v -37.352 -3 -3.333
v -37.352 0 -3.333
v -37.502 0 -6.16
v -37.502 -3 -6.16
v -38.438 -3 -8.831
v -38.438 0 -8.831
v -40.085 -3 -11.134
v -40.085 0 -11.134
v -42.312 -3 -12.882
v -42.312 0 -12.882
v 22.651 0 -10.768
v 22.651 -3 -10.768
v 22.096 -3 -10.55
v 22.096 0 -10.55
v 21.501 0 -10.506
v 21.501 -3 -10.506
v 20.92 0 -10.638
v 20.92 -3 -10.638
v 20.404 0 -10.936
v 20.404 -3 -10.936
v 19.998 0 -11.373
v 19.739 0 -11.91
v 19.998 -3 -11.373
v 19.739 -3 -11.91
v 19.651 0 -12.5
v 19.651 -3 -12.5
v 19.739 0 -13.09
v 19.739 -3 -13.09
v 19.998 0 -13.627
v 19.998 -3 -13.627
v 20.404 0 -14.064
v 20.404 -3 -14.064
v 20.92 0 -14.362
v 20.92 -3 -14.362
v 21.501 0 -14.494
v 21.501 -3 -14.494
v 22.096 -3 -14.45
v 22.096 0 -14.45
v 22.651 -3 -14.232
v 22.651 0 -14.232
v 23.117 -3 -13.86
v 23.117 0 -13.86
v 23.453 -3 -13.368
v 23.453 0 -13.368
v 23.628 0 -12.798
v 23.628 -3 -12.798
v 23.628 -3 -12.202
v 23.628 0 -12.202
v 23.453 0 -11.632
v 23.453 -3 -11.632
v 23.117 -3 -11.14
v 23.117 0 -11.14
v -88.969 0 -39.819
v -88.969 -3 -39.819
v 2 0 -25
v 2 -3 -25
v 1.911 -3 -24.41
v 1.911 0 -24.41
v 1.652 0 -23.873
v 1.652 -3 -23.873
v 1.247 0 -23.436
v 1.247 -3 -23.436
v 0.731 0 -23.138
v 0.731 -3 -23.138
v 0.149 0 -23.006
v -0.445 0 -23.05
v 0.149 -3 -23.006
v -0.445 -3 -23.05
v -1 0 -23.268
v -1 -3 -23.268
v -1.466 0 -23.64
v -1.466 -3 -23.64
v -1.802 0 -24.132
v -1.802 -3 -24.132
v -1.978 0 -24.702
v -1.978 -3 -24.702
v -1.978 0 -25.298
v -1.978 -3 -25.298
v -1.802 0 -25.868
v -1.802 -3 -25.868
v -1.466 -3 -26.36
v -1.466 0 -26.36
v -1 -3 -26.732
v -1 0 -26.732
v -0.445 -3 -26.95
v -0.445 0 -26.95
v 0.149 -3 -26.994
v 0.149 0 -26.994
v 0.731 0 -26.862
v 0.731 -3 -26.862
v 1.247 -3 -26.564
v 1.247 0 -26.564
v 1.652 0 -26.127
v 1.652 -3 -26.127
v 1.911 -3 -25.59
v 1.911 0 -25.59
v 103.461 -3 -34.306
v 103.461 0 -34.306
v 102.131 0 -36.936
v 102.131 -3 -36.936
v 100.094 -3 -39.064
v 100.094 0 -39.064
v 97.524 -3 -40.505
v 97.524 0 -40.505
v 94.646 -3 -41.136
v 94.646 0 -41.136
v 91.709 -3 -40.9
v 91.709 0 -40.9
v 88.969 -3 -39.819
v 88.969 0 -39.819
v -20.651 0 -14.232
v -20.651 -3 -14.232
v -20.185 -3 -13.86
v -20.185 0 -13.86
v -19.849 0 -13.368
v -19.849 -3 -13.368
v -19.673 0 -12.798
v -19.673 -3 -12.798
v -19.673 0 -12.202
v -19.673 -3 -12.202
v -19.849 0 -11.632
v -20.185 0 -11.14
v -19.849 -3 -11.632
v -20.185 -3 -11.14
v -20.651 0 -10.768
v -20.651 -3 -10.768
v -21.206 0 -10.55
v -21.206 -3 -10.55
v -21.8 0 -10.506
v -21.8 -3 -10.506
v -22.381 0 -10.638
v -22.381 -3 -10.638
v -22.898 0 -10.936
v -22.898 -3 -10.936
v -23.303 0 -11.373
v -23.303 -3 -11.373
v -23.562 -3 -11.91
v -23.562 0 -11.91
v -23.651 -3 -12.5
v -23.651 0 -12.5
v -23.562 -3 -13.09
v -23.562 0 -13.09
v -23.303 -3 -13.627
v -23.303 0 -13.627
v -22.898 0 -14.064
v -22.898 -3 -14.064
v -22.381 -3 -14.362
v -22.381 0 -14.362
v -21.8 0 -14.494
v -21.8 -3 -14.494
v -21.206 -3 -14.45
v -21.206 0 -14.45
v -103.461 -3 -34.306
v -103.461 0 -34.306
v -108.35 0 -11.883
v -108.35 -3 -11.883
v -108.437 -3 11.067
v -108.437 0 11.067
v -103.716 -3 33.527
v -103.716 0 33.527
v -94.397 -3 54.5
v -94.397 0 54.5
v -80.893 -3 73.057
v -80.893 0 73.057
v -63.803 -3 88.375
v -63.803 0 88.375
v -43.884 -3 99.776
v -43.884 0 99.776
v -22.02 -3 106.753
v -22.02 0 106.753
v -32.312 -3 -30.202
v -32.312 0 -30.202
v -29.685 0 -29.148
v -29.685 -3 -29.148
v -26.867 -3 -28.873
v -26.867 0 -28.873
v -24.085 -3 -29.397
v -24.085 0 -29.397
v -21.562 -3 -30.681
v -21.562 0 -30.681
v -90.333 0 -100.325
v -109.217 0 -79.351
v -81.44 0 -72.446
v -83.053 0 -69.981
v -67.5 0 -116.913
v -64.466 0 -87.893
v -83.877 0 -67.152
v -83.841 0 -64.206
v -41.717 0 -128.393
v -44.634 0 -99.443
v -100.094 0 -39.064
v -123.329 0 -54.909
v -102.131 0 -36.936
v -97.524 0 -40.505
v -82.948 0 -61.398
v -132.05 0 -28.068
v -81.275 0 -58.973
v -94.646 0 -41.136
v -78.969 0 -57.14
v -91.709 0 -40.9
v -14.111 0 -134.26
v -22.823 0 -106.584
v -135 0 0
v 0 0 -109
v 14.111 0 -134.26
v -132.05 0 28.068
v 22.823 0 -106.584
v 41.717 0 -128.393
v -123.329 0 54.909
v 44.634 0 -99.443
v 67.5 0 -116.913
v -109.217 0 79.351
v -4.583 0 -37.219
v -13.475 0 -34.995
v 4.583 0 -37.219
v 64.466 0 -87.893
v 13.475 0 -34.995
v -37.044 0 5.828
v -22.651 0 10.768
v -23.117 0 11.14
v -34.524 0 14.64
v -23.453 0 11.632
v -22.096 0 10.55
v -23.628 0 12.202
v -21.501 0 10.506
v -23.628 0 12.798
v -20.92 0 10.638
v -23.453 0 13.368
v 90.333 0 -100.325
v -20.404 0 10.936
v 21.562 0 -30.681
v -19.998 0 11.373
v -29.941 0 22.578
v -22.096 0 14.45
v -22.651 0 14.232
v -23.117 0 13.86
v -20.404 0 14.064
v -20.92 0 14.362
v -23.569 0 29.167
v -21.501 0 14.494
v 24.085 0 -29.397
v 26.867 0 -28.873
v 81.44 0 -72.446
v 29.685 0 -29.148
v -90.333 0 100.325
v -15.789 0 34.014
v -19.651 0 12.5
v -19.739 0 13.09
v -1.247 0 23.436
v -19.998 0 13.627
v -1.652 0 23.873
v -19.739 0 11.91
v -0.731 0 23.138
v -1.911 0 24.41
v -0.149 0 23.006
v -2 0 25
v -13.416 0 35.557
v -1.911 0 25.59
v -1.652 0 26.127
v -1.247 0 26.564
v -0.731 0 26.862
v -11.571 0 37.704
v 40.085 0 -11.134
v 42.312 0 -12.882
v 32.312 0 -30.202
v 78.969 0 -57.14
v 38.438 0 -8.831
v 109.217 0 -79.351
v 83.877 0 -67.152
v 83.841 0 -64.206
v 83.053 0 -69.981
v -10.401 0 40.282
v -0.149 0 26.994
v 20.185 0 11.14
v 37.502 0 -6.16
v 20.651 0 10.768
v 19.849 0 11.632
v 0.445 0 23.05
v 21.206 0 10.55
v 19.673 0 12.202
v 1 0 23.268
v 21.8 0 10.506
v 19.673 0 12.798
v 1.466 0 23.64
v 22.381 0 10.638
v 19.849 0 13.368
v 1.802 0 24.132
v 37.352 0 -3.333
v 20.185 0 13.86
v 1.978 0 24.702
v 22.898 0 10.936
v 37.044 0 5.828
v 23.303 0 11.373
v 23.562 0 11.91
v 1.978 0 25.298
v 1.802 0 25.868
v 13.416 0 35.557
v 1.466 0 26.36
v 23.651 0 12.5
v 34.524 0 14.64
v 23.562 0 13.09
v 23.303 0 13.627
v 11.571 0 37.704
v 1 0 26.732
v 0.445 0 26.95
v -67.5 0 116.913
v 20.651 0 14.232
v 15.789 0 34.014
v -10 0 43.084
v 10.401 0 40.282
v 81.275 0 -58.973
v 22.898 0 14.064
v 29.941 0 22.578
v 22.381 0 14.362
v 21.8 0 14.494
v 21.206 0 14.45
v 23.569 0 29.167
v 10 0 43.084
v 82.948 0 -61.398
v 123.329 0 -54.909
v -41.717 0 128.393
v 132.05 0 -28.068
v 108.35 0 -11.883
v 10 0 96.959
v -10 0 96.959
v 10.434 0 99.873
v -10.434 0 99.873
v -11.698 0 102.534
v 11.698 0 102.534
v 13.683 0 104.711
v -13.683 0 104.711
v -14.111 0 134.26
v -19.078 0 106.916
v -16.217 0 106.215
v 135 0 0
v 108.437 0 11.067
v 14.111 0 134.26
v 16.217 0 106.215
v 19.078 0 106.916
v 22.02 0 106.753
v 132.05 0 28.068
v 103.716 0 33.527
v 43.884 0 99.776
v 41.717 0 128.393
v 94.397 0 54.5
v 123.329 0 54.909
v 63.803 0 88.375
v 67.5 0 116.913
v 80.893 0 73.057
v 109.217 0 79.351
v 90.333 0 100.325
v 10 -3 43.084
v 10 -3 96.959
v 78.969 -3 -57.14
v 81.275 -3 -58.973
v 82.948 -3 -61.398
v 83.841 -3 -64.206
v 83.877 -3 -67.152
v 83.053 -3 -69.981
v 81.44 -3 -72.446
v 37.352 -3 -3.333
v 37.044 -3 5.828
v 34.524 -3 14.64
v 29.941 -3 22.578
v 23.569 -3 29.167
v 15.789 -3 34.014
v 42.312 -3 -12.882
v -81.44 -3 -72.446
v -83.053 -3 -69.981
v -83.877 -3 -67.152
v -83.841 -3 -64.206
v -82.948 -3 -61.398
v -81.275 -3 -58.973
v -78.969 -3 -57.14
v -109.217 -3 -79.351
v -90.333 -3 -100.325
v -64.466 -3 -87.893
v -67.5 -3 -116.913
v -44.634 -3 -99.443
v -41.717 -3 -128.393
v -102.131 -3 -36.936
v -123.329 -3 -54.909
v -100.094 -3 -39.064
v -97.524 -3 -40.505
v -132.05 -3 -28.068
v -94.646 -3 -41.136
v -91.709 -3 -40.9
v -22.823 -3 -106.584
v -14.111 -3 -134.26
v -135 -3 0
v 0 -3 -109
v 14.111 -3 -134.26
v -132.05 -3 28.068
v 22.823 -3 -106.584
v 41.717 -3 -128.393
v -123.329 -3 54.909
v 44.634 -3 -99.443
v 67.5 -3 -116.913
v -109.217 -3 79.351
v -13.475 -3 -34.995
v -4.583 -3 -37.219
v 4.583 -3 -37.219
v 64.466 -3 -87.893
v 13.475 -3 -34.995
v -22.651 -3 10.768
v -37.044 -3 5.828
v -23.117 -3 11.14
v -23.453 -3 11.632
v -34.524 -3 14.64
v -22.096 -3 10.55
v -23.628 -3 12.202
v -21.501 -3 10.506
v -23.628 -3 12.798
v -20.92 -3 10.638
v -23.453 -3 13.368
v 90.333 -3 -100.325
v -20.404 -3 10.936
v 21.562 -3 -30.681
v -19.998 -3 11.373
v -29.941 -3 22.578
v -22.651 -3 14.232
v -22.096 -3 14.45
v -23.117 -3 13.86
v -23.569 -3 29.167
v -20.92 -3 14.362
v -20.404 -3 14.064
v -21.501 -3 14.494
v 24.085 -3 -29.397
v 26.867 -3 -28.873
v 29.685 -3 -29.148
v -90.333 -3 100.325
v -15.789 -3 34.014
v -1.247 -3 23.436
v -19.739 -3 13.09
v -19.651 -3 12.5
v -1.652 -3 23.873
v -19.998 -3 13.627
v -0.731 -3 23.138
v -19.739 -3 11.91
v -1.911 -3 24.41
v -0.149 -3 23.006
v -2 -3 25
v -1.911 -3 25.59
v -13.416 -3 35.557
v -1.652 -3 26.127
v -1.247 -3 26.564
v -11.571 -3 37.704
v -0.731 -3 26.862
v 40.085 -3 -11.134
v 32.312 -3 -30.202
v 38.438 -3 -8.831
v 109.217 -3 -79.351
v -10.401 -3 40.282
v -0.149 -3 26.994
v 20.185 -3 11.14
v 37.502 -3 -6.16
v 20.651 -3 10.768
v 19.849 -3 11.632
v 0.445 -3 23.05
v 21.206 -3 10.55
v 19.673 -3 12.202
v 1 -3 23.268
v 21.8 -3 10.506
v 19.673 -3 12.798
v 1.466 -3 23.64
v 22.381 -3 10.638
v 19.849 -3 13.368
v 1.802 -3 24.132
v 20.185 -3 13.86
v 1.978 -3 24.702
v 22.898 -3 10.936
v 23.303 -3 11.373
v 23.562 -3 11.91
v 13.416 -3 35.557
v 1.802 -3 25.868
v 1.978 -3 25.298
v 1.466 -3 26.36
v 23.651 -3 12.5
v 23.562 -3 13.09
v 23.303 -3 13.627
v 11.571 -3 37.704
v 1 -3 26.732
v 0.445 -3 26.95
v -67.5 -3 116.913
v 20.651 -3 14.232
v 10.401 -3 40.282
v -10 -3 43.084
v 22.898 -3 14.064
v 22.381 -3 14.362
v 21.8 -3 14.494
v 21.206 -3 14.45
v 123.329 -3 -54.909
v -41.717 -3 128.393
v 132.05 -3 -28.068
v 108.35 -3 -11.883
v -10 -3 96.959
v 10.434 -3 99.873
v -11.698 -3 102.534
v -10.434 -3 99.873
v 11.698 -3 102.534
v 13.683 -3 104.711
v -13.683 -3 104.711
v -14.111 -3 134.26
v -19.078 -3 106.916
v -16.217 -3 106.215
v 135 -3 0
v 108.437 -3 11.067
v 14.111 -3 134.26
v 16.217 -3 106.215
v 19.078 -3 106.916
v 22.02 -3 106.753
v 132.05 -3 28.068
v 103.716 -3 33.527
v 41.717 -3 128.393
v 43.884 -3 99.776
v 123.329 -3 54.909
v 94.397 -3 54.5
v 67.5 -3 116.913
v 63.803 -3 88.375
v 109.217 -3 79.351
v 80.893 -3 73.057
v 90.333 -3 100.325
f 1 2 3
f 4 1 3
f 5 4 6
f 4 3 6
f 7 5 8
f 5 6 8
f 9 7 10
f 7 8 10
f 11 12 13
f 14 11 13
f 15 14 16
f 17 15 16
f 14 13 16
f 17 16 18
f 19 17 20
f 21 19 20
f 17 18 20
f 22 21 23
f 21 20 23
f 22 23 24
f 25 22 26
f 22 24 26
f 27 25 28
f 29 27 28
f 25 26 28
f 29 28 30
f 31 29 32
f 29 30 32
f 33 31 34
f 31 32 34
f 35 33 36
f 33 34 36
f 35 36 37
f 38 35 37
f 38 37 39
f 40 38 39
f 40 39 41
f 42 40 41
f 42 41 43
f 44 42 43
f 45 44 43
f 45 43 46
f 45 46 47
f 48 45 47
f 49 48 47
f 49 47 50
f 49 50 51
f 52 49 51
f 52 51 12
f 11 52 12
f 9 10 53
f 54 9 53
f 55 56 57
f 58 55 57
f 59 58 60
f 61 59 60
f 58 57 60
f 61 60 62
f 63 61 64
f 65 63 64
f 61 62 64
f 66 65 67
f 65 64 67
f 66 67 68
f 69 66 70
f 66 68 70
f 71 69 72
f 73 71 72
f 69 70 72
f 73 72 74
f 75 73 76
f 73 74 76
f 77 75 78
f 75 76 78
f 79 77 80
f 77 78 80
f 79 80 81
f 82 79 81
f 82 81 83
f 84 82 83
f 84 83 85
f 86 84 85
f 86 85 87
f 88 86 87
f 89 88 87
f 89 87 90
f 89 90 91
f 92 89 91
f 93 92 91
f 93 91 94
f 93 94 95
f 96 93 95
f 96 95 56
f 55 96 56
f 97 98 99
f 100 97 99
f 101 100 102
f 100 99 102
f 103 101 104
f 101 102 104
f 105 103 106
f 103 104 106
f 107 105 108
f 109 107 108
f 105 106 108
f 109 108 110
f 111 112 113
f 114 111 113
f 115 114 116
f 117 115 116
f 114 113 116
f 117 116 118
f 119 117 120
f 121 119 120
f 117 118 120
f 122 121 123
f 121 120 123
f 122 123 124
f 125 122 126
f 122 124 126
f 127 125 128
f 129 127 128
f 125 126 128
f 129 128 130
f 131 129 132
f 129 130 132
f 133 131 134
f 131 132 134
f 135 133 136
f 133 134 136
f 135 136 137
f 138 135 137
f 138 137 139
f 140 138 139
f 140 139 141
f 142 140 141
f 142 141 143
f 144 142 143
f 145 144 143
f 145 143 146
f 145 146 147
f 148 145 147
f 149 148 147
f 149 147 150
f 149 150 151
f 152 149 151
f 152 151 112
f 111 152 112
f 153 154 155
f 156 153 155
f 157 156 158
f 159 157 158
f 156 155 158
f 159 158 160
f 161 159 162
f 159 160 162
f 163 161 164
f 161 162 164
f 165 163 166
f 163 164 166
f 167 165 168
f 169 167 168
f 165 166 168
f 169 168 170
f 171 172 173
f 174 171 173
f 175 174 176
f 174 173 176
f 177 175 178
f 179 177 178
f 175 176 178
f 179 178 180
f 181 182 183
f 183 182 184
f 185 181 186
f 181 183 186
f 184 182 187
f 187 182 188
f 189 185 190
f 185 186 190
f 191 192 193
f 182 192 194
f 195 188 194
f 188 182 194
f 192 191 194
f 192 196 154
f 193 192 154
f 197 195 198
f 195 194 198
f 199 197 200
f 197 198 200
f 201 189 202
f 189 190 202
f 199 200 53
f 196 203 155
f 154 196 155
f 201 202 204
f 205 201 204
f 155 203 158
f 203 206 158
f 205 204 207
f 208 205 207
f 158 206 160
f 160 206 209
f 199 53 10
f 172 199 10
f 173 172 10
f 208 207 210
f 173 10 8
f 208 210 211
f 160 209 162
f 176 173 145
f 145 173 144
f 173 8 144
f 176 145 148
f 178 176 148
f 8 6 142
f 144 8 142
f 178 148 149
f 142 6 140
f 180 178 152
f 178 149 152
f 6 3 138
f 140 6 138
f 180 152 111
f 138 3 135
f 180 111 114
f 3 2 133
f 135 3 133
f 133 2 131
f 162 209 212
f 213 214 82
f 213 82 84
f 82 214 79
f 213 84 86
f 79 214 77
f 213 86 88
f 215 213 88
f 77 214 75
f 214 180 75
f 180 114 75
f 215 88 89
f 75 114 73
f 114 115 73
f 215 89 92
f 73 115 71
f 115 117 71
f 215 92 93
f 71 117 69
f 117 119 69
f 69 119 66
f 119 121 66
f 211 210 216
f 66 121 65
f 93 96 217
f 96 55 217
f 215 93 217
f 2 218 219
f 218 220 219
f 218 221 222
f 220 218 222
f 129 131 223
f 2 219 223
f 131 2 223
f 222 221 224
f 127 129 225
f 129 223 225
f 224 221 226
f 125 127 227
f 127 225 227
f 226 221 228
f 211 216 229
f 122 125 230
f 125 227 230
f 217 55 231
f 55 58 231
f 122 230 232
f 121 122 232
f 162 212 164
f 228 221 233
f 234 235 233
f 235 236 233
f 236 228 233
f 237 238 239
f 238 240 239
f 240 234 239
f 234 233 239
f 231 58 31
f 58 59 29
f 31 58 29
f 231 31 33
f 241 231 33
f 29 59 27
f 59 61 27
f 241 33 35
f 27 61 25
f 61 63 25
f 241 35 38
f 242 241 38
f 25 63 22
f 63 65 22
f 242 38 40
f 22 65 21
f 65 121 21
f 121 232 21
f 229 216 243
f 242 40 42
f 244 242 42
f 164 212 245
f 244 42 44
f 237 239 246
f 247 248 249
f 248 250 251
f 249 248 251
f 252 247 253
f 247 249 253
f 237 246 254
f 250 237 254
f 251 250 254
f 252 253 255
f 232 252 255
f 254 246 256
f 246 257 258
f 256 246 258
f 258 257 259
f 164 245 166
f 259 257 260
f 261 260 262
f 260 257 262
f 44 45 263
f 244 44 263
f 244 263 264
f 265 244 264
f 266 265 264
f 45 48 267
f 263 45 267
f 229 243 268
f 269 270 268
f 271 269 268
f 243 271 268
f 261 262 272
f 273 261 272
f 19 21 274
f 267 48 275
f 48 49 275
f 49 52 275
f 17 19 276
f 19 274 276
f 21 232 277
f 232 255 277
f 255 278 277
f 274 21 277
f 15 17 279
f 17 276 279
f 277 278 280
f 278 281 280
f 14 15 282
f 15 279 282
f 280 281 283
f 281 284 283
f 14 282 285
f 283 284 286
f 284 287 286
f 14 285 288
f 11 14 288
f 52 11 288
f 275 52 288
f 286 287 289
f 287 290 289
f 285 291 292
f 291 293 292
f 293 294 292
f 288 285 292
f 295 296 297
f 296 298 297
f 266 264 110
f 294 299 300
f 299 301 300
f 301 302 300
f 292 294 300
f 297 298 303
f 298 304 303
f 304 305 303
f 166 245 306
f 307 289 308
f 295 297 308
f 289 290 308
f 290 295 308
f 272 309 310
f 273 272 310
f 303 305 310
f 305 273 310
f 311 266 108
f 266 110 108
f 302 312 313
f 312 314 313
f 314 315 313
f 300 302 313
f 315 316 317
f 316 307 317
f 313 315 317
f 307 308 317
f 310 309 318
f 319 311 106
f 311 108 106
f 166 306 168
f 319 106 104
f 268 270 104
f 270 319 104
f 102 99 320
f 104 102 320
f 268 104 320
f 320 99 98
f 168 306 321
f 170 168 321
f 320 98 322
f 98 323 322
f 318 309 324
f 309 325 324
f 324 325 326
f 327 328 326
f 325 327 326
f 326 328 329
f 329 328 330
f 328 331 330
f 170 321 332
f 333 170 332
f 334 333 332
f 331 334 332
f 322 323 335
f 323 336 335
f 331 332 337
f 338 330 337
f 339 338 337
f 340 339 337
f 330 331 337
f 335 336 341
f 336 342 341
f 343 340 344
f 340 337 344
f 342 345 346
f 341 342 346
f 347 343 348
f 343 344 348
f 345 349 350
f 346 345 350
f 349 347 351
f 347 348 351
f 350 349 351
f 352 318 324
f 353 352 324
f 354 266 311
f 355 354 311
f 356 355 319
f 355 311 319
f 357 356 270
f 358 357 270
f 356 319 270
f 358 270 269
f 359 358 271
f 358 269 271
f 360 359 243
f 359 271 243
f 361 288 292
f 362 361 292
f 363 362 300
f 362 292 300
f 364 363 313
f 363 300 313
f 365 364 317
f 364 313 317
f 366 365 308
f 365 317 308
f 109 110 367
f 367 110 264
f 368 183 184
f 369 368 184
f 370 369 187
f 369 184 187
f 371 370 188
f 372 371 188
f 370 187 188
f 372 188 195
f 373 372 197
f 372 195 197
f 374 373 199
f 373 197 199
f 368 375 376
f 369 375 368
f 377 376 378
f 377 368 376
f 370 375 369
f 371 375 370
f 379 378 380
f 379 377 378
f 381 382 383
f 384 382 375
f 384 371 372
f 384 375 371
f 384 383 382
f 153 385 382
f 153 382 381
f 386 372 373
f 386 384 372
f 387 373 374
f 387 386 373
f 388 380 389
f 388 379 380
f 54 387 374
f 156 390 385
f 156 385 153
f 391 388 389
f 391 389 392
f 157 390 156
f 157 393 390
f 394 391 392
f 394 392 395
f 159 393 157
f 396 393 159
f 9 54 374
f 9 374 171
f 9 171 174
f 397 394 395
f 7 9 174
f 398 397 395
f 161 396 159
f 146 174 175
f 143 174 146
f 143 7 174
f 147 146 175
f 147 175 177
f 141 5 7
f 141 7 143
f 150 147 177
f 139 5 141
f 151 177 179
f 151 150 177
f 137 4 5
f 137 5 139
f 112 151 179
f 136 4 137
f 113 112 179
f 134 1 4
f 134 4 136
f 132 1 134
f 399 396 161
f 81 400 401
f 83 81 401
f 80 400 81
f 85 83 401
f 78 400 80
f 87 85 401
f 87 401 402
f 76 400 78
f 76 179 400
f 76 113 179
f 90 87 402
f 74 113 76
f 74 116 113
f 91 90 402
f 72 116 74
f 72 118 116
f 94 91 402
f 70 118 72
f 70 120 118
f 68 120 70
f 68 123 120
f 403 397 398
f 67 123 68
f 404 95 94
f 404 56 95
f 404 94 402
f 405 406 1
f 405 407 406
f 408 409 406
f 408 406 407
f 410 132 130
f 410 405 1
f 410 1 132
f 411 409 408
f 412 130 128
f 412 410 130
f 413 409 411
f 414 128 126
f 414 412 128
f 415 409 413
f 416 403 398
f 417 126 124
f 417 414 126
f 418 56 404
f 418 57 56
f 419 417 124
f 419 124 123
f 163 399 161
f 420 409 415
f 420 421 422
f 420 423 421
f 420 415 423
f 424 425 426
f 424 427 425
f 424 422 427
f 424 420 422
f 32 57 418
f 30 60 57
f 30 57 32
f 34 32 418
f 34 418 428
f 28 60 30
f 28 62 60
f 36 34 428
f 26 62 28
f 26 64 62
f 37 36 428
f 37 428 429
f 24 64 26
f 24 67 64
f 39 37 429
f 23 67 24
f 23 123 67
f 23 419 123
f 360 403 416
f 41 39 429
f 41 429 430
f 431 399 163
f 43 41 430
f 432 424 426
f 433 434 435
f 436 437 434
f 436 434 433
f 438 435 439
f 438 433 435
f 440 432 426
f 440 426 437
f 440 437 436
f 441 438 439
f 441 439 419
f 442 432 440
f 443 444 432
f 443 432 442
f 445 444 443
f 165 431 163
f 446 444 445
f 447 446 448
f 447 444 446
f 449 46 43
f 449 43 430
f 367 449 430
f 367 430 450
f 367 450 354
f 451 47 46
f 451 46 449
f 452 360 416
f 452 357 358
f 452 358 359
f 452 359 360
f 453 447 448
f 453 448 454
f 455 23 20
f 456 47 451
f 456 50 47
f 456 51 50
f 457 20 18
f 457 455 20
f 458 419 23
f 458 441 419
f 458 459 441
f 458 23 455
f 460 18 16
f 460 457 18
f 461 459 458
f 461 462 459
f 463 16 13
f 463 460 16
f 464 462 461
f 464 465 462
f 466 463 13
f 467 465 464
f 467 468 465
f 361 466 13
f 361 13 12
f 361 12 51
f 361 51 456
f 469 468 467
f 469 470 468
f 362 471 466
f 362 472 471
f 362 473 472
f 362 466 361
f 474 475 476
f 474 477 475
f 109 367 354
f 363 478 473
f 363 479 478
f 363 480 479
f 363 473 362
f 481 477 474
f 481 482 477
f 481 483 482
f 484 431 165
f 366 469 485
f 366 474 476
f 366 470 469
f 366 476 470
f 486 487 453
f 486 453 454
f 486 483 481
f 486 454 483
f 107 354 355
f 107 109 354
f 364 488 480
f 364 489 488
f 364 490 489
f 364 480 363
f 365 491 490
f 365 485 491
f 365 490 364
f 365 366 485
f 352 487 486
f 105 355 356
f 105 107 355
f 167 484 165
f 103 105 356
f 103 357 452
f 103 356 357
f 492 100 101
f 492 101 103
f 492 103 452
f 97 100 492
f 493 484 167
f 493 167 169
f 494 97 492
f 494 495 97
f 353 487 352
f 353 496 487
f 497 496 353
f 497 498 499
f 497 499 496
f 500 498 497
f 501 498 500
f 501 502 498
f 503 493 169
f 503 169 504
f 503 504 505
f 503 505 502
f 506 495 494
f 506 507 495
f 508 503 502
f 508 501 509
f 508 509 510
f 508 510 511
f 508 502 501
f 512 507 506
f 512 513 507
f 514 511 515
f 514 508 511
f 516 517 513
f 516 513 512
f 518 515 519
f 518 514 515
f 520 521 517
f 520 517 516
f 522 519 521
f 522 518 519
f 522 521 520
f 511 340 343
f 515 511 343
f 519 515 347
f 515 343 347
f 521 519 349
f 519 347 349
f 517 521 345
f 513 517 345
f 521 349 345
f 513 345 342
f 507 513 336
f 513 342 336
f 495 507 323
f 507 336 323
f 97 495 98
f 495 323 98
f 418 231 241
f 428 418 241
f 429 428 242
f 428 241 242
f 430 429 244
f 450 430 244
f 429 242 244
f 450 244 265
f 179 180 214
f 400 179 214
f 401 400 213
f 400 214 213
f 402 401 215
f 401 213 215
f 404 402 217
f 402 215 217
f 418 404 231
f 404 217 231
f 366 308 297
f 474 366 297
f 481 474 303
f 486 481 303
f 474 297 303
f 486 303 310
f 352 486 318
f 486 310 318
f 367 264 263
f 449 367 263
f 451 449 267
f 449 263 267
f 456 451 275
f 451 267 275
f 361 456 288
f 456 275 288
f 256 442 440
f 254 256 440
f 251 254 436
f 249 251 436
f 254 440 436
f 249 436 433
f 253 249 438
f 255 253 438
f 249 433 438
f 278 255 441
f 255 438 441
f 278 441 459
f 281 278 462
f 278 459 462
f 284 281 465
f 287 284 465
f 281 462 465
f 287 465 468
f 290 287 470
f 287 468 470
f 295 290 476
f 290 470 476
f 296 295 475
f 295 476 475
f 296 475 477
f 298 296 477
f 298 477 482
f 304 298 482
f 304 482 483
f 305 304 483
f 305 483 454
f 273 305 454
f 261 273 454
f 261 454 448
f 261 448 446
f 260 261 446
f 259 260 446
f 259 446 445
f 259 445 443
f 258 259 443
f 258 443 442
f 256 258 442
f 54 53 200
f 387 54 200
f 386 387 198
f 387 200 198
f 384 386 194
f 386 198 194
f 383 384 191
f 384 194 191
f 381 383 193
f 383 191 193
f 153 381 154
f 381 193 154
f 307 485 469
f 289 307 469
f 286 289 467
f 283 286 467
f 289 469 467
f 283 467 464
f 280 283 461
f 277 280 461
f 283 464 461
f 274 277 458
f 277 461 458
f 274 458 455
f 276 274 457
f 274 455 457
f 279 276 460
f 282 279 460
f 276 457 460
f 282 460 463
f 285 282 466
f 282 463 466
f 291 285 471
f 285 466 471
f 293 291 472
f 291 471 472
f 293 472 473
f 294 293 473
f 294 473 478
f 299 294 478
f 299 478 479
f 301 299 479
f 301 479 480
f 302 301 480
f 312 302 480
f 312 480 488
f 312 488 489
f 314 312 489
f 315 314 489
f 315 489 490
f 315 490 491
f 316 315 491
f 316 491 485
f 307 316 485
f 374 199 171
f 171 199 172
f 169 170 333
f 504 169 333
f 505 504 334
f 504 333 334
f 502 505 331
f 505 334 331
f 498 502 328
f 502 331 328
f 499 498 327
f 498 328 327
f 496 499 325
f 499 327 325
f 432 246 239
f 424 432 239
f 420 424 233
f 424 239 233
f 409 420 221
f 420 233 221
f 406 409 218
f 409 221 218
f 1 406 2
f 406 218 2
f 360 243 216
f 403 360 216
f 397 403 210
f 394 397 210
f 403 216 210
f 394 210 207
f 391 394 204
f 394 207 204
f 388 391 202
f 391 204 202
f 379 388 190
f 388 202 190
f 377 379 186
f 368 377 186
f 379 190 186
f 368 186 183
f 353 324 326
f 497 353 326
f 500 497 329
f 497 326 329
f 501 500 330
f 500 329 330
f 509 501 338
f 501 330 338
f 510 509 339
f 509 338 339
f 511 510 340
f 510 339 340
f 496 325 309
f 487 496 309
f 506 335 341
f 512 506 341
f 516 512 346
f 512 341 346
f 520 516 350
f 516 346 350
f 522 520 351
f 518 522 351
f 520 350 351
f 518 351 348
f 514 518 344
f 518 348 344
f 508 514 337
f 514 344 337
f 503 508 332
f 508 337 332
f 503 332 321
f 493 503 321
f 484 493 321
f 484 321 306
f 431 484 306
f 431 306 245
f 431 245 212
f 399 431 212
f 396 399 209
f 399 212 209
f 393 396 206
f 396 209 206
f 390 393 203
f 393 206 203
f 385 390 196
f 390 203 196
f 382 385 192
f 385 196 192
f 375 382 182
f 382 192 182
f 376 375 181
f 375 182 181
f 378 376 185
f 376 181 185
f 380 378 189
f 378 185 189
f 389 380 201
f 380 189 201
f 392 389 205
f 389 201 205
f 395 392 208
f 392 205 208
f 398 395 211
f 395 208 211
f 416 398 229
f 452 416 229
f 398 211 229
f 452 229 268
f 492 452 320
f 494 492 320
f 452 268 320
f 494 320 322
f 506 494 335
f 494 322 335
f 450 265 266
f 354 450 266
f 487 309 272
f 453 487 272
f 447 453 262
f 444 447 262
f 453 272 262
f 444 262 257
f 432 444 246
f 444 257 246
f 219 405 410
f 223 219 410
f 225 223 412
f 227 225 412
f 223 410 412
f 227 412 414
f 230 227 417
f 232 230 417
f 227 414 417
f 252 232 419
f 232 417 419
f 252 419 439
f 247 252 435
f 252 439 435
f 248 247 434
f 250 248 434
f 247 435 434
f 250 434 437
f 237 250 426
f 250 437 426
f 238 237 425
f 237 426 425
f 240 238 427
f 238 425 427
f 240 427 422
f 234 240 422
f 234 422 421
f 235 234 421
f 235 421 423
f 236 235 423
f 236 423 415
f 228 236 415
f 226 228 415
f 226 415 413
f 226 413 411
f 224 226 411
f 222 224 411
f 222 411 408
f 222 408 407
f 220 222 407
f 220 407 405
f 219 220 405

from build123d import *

# Parameters (mm, degrees)
F0_R            = 135
F1_DEPTH        = 3
F3_D            = 4
F3_COPIES_COUNT = 6


# Not quite as in the source:
# - a pattern or mirror of a feature is missing from the dataset's text; its kind, count and spacing are read off the source's solid


with BuildPart() as f1:
    # F0 (on Front) → F1 (new body)
    with BuildSketch(Plane.XZ):
        Circle(F0_R)
        with BuildLine():
            Line((-78.968744185, -57.1396310965), (-32.3120288915, -30.2023639624))
            ThreePointArc((-32.3120288915, -30.2023639624), (-26.8672094621, -28.8725161151), (-21.5621280722, -30.6810142107))
            ThreePointArc((-21.5621280722, -30.6810142107), (0, -37.5), (21.5621280722, -30.6810142107))
            ThreePointArc((21.5621280722, -30.6810142107), (26.8672094621, -28.8725161151), (32.3120288915, -30.2023639624))
            Line((32.3120288915, -30.2023639624), (78.968744185, -57.1396310965))
            ThreePointArc((78.968744185, -57.1396310965), (83.8408747407, -64.2058216819), (81.4403345067, -72.4463381783))
            ThreePointArc((81.4403345067, -72.4463381783), (0, -109), (-81.4403345067, -72.4463381783))
            ThreePointArc((-81.4403345067, -72.4463381783), (-83.8408747407, -64.2058216819), (-78.968744185, -57.1396310965))
        make_face(mode=Mode.SUBTRACT)
        with BuildLine():
            ThreePointArc((-10, 43.084219849), (-11.5707276958, 37.7039439805), (-15.7894736842, 34.0138577756))
            ThreePointArc((-15.7894736842, 34.0138577756), (-32.4759526419, 18.75), (-37.3516017564, -3.3328435649))
            ThreePointArc((-37.3516017564, -3.3328435649), (-38.4379371579, -8.8314278655), (-42.3120288915, -12.8818558867))
            Line((-42.3120288915, -12.8818558867), (-88.968744185, -39.8191230209))
            ThreePointArc((-88.968744185, -39.8191230209), (-97.5243100178, -40.50541656), (-103.4605365269, -34.3062294864))
            ThreePointArc((-103.4605365269, -34.3062294864), (-94.3967690125, 54.5), (-22.0202020202, 106.7525676646))
            ThreePointArc((-22.0202020202, 106.7525676646), (-13.6834352771, 104.7112382419), (-10, 96.9587541174))
            Line((-10, 96.9587541174), (-10, 43.084219849))
        make_face(mode=Mode.SUBTRACT)
        with BuildLine():
            ThreePointArc((15.7894736842, 34.0138577756), (11.5707276958, 37.7039439805), (10, 43.084219849))
            Line((10, 43.084219849), (10, 96.9587541174))
            ThreePointArc((10, 96.9587541174), (13.6834352771, 104.7112382419), (22.0202020202, 106.7525676646))
            ThreePointArc((22.0202020202, 106.7525676646), (94.3967690125, 54.5), (103.4605365269, -34.3062294864))
            ThreePointArc((103.4605365269, -34.3062294864), (97.5243100178, -40.50541656), (88.968744185, -39.8191230209))
            Line((88.968744185, -39.8191230209), (42.3120288915, -12.8818558867))
            ThreePointArc((42.3120288915, -12.8818558867), (38.4379371579, -8.8314278655), (37.3516017564, -3.3328435649))
            ThreePointArc((37.3516017564, -3.3328435649), (32.4759526419, 18.75), (15.7894736842, 34.0138577756))
        make_face(mode=Mode.SUBTRACT)
    extrude(amount=F1_DEPTH)

    # F3 (through all)
    with Locations(Plane(origin=(0, 0, 0), x_dir=(1, 0, 0), z_dir=(0, 1, 0))):
        with Locations((0, -25)):
            f3 = Hole(F3_D / 2)

    # F3_copies: F3 ×6 about axis
    f3_copies_axis = Axis((0, 0, 0), (0, 1, 0))
    for i in range(1, F3_COPIES_COUNT):
        add(f3.rotate(f3_copies_axis, i * 360 / F3_COPIES_COUNT), mode=Mode.SUBTRACT)


solid = f1.part
